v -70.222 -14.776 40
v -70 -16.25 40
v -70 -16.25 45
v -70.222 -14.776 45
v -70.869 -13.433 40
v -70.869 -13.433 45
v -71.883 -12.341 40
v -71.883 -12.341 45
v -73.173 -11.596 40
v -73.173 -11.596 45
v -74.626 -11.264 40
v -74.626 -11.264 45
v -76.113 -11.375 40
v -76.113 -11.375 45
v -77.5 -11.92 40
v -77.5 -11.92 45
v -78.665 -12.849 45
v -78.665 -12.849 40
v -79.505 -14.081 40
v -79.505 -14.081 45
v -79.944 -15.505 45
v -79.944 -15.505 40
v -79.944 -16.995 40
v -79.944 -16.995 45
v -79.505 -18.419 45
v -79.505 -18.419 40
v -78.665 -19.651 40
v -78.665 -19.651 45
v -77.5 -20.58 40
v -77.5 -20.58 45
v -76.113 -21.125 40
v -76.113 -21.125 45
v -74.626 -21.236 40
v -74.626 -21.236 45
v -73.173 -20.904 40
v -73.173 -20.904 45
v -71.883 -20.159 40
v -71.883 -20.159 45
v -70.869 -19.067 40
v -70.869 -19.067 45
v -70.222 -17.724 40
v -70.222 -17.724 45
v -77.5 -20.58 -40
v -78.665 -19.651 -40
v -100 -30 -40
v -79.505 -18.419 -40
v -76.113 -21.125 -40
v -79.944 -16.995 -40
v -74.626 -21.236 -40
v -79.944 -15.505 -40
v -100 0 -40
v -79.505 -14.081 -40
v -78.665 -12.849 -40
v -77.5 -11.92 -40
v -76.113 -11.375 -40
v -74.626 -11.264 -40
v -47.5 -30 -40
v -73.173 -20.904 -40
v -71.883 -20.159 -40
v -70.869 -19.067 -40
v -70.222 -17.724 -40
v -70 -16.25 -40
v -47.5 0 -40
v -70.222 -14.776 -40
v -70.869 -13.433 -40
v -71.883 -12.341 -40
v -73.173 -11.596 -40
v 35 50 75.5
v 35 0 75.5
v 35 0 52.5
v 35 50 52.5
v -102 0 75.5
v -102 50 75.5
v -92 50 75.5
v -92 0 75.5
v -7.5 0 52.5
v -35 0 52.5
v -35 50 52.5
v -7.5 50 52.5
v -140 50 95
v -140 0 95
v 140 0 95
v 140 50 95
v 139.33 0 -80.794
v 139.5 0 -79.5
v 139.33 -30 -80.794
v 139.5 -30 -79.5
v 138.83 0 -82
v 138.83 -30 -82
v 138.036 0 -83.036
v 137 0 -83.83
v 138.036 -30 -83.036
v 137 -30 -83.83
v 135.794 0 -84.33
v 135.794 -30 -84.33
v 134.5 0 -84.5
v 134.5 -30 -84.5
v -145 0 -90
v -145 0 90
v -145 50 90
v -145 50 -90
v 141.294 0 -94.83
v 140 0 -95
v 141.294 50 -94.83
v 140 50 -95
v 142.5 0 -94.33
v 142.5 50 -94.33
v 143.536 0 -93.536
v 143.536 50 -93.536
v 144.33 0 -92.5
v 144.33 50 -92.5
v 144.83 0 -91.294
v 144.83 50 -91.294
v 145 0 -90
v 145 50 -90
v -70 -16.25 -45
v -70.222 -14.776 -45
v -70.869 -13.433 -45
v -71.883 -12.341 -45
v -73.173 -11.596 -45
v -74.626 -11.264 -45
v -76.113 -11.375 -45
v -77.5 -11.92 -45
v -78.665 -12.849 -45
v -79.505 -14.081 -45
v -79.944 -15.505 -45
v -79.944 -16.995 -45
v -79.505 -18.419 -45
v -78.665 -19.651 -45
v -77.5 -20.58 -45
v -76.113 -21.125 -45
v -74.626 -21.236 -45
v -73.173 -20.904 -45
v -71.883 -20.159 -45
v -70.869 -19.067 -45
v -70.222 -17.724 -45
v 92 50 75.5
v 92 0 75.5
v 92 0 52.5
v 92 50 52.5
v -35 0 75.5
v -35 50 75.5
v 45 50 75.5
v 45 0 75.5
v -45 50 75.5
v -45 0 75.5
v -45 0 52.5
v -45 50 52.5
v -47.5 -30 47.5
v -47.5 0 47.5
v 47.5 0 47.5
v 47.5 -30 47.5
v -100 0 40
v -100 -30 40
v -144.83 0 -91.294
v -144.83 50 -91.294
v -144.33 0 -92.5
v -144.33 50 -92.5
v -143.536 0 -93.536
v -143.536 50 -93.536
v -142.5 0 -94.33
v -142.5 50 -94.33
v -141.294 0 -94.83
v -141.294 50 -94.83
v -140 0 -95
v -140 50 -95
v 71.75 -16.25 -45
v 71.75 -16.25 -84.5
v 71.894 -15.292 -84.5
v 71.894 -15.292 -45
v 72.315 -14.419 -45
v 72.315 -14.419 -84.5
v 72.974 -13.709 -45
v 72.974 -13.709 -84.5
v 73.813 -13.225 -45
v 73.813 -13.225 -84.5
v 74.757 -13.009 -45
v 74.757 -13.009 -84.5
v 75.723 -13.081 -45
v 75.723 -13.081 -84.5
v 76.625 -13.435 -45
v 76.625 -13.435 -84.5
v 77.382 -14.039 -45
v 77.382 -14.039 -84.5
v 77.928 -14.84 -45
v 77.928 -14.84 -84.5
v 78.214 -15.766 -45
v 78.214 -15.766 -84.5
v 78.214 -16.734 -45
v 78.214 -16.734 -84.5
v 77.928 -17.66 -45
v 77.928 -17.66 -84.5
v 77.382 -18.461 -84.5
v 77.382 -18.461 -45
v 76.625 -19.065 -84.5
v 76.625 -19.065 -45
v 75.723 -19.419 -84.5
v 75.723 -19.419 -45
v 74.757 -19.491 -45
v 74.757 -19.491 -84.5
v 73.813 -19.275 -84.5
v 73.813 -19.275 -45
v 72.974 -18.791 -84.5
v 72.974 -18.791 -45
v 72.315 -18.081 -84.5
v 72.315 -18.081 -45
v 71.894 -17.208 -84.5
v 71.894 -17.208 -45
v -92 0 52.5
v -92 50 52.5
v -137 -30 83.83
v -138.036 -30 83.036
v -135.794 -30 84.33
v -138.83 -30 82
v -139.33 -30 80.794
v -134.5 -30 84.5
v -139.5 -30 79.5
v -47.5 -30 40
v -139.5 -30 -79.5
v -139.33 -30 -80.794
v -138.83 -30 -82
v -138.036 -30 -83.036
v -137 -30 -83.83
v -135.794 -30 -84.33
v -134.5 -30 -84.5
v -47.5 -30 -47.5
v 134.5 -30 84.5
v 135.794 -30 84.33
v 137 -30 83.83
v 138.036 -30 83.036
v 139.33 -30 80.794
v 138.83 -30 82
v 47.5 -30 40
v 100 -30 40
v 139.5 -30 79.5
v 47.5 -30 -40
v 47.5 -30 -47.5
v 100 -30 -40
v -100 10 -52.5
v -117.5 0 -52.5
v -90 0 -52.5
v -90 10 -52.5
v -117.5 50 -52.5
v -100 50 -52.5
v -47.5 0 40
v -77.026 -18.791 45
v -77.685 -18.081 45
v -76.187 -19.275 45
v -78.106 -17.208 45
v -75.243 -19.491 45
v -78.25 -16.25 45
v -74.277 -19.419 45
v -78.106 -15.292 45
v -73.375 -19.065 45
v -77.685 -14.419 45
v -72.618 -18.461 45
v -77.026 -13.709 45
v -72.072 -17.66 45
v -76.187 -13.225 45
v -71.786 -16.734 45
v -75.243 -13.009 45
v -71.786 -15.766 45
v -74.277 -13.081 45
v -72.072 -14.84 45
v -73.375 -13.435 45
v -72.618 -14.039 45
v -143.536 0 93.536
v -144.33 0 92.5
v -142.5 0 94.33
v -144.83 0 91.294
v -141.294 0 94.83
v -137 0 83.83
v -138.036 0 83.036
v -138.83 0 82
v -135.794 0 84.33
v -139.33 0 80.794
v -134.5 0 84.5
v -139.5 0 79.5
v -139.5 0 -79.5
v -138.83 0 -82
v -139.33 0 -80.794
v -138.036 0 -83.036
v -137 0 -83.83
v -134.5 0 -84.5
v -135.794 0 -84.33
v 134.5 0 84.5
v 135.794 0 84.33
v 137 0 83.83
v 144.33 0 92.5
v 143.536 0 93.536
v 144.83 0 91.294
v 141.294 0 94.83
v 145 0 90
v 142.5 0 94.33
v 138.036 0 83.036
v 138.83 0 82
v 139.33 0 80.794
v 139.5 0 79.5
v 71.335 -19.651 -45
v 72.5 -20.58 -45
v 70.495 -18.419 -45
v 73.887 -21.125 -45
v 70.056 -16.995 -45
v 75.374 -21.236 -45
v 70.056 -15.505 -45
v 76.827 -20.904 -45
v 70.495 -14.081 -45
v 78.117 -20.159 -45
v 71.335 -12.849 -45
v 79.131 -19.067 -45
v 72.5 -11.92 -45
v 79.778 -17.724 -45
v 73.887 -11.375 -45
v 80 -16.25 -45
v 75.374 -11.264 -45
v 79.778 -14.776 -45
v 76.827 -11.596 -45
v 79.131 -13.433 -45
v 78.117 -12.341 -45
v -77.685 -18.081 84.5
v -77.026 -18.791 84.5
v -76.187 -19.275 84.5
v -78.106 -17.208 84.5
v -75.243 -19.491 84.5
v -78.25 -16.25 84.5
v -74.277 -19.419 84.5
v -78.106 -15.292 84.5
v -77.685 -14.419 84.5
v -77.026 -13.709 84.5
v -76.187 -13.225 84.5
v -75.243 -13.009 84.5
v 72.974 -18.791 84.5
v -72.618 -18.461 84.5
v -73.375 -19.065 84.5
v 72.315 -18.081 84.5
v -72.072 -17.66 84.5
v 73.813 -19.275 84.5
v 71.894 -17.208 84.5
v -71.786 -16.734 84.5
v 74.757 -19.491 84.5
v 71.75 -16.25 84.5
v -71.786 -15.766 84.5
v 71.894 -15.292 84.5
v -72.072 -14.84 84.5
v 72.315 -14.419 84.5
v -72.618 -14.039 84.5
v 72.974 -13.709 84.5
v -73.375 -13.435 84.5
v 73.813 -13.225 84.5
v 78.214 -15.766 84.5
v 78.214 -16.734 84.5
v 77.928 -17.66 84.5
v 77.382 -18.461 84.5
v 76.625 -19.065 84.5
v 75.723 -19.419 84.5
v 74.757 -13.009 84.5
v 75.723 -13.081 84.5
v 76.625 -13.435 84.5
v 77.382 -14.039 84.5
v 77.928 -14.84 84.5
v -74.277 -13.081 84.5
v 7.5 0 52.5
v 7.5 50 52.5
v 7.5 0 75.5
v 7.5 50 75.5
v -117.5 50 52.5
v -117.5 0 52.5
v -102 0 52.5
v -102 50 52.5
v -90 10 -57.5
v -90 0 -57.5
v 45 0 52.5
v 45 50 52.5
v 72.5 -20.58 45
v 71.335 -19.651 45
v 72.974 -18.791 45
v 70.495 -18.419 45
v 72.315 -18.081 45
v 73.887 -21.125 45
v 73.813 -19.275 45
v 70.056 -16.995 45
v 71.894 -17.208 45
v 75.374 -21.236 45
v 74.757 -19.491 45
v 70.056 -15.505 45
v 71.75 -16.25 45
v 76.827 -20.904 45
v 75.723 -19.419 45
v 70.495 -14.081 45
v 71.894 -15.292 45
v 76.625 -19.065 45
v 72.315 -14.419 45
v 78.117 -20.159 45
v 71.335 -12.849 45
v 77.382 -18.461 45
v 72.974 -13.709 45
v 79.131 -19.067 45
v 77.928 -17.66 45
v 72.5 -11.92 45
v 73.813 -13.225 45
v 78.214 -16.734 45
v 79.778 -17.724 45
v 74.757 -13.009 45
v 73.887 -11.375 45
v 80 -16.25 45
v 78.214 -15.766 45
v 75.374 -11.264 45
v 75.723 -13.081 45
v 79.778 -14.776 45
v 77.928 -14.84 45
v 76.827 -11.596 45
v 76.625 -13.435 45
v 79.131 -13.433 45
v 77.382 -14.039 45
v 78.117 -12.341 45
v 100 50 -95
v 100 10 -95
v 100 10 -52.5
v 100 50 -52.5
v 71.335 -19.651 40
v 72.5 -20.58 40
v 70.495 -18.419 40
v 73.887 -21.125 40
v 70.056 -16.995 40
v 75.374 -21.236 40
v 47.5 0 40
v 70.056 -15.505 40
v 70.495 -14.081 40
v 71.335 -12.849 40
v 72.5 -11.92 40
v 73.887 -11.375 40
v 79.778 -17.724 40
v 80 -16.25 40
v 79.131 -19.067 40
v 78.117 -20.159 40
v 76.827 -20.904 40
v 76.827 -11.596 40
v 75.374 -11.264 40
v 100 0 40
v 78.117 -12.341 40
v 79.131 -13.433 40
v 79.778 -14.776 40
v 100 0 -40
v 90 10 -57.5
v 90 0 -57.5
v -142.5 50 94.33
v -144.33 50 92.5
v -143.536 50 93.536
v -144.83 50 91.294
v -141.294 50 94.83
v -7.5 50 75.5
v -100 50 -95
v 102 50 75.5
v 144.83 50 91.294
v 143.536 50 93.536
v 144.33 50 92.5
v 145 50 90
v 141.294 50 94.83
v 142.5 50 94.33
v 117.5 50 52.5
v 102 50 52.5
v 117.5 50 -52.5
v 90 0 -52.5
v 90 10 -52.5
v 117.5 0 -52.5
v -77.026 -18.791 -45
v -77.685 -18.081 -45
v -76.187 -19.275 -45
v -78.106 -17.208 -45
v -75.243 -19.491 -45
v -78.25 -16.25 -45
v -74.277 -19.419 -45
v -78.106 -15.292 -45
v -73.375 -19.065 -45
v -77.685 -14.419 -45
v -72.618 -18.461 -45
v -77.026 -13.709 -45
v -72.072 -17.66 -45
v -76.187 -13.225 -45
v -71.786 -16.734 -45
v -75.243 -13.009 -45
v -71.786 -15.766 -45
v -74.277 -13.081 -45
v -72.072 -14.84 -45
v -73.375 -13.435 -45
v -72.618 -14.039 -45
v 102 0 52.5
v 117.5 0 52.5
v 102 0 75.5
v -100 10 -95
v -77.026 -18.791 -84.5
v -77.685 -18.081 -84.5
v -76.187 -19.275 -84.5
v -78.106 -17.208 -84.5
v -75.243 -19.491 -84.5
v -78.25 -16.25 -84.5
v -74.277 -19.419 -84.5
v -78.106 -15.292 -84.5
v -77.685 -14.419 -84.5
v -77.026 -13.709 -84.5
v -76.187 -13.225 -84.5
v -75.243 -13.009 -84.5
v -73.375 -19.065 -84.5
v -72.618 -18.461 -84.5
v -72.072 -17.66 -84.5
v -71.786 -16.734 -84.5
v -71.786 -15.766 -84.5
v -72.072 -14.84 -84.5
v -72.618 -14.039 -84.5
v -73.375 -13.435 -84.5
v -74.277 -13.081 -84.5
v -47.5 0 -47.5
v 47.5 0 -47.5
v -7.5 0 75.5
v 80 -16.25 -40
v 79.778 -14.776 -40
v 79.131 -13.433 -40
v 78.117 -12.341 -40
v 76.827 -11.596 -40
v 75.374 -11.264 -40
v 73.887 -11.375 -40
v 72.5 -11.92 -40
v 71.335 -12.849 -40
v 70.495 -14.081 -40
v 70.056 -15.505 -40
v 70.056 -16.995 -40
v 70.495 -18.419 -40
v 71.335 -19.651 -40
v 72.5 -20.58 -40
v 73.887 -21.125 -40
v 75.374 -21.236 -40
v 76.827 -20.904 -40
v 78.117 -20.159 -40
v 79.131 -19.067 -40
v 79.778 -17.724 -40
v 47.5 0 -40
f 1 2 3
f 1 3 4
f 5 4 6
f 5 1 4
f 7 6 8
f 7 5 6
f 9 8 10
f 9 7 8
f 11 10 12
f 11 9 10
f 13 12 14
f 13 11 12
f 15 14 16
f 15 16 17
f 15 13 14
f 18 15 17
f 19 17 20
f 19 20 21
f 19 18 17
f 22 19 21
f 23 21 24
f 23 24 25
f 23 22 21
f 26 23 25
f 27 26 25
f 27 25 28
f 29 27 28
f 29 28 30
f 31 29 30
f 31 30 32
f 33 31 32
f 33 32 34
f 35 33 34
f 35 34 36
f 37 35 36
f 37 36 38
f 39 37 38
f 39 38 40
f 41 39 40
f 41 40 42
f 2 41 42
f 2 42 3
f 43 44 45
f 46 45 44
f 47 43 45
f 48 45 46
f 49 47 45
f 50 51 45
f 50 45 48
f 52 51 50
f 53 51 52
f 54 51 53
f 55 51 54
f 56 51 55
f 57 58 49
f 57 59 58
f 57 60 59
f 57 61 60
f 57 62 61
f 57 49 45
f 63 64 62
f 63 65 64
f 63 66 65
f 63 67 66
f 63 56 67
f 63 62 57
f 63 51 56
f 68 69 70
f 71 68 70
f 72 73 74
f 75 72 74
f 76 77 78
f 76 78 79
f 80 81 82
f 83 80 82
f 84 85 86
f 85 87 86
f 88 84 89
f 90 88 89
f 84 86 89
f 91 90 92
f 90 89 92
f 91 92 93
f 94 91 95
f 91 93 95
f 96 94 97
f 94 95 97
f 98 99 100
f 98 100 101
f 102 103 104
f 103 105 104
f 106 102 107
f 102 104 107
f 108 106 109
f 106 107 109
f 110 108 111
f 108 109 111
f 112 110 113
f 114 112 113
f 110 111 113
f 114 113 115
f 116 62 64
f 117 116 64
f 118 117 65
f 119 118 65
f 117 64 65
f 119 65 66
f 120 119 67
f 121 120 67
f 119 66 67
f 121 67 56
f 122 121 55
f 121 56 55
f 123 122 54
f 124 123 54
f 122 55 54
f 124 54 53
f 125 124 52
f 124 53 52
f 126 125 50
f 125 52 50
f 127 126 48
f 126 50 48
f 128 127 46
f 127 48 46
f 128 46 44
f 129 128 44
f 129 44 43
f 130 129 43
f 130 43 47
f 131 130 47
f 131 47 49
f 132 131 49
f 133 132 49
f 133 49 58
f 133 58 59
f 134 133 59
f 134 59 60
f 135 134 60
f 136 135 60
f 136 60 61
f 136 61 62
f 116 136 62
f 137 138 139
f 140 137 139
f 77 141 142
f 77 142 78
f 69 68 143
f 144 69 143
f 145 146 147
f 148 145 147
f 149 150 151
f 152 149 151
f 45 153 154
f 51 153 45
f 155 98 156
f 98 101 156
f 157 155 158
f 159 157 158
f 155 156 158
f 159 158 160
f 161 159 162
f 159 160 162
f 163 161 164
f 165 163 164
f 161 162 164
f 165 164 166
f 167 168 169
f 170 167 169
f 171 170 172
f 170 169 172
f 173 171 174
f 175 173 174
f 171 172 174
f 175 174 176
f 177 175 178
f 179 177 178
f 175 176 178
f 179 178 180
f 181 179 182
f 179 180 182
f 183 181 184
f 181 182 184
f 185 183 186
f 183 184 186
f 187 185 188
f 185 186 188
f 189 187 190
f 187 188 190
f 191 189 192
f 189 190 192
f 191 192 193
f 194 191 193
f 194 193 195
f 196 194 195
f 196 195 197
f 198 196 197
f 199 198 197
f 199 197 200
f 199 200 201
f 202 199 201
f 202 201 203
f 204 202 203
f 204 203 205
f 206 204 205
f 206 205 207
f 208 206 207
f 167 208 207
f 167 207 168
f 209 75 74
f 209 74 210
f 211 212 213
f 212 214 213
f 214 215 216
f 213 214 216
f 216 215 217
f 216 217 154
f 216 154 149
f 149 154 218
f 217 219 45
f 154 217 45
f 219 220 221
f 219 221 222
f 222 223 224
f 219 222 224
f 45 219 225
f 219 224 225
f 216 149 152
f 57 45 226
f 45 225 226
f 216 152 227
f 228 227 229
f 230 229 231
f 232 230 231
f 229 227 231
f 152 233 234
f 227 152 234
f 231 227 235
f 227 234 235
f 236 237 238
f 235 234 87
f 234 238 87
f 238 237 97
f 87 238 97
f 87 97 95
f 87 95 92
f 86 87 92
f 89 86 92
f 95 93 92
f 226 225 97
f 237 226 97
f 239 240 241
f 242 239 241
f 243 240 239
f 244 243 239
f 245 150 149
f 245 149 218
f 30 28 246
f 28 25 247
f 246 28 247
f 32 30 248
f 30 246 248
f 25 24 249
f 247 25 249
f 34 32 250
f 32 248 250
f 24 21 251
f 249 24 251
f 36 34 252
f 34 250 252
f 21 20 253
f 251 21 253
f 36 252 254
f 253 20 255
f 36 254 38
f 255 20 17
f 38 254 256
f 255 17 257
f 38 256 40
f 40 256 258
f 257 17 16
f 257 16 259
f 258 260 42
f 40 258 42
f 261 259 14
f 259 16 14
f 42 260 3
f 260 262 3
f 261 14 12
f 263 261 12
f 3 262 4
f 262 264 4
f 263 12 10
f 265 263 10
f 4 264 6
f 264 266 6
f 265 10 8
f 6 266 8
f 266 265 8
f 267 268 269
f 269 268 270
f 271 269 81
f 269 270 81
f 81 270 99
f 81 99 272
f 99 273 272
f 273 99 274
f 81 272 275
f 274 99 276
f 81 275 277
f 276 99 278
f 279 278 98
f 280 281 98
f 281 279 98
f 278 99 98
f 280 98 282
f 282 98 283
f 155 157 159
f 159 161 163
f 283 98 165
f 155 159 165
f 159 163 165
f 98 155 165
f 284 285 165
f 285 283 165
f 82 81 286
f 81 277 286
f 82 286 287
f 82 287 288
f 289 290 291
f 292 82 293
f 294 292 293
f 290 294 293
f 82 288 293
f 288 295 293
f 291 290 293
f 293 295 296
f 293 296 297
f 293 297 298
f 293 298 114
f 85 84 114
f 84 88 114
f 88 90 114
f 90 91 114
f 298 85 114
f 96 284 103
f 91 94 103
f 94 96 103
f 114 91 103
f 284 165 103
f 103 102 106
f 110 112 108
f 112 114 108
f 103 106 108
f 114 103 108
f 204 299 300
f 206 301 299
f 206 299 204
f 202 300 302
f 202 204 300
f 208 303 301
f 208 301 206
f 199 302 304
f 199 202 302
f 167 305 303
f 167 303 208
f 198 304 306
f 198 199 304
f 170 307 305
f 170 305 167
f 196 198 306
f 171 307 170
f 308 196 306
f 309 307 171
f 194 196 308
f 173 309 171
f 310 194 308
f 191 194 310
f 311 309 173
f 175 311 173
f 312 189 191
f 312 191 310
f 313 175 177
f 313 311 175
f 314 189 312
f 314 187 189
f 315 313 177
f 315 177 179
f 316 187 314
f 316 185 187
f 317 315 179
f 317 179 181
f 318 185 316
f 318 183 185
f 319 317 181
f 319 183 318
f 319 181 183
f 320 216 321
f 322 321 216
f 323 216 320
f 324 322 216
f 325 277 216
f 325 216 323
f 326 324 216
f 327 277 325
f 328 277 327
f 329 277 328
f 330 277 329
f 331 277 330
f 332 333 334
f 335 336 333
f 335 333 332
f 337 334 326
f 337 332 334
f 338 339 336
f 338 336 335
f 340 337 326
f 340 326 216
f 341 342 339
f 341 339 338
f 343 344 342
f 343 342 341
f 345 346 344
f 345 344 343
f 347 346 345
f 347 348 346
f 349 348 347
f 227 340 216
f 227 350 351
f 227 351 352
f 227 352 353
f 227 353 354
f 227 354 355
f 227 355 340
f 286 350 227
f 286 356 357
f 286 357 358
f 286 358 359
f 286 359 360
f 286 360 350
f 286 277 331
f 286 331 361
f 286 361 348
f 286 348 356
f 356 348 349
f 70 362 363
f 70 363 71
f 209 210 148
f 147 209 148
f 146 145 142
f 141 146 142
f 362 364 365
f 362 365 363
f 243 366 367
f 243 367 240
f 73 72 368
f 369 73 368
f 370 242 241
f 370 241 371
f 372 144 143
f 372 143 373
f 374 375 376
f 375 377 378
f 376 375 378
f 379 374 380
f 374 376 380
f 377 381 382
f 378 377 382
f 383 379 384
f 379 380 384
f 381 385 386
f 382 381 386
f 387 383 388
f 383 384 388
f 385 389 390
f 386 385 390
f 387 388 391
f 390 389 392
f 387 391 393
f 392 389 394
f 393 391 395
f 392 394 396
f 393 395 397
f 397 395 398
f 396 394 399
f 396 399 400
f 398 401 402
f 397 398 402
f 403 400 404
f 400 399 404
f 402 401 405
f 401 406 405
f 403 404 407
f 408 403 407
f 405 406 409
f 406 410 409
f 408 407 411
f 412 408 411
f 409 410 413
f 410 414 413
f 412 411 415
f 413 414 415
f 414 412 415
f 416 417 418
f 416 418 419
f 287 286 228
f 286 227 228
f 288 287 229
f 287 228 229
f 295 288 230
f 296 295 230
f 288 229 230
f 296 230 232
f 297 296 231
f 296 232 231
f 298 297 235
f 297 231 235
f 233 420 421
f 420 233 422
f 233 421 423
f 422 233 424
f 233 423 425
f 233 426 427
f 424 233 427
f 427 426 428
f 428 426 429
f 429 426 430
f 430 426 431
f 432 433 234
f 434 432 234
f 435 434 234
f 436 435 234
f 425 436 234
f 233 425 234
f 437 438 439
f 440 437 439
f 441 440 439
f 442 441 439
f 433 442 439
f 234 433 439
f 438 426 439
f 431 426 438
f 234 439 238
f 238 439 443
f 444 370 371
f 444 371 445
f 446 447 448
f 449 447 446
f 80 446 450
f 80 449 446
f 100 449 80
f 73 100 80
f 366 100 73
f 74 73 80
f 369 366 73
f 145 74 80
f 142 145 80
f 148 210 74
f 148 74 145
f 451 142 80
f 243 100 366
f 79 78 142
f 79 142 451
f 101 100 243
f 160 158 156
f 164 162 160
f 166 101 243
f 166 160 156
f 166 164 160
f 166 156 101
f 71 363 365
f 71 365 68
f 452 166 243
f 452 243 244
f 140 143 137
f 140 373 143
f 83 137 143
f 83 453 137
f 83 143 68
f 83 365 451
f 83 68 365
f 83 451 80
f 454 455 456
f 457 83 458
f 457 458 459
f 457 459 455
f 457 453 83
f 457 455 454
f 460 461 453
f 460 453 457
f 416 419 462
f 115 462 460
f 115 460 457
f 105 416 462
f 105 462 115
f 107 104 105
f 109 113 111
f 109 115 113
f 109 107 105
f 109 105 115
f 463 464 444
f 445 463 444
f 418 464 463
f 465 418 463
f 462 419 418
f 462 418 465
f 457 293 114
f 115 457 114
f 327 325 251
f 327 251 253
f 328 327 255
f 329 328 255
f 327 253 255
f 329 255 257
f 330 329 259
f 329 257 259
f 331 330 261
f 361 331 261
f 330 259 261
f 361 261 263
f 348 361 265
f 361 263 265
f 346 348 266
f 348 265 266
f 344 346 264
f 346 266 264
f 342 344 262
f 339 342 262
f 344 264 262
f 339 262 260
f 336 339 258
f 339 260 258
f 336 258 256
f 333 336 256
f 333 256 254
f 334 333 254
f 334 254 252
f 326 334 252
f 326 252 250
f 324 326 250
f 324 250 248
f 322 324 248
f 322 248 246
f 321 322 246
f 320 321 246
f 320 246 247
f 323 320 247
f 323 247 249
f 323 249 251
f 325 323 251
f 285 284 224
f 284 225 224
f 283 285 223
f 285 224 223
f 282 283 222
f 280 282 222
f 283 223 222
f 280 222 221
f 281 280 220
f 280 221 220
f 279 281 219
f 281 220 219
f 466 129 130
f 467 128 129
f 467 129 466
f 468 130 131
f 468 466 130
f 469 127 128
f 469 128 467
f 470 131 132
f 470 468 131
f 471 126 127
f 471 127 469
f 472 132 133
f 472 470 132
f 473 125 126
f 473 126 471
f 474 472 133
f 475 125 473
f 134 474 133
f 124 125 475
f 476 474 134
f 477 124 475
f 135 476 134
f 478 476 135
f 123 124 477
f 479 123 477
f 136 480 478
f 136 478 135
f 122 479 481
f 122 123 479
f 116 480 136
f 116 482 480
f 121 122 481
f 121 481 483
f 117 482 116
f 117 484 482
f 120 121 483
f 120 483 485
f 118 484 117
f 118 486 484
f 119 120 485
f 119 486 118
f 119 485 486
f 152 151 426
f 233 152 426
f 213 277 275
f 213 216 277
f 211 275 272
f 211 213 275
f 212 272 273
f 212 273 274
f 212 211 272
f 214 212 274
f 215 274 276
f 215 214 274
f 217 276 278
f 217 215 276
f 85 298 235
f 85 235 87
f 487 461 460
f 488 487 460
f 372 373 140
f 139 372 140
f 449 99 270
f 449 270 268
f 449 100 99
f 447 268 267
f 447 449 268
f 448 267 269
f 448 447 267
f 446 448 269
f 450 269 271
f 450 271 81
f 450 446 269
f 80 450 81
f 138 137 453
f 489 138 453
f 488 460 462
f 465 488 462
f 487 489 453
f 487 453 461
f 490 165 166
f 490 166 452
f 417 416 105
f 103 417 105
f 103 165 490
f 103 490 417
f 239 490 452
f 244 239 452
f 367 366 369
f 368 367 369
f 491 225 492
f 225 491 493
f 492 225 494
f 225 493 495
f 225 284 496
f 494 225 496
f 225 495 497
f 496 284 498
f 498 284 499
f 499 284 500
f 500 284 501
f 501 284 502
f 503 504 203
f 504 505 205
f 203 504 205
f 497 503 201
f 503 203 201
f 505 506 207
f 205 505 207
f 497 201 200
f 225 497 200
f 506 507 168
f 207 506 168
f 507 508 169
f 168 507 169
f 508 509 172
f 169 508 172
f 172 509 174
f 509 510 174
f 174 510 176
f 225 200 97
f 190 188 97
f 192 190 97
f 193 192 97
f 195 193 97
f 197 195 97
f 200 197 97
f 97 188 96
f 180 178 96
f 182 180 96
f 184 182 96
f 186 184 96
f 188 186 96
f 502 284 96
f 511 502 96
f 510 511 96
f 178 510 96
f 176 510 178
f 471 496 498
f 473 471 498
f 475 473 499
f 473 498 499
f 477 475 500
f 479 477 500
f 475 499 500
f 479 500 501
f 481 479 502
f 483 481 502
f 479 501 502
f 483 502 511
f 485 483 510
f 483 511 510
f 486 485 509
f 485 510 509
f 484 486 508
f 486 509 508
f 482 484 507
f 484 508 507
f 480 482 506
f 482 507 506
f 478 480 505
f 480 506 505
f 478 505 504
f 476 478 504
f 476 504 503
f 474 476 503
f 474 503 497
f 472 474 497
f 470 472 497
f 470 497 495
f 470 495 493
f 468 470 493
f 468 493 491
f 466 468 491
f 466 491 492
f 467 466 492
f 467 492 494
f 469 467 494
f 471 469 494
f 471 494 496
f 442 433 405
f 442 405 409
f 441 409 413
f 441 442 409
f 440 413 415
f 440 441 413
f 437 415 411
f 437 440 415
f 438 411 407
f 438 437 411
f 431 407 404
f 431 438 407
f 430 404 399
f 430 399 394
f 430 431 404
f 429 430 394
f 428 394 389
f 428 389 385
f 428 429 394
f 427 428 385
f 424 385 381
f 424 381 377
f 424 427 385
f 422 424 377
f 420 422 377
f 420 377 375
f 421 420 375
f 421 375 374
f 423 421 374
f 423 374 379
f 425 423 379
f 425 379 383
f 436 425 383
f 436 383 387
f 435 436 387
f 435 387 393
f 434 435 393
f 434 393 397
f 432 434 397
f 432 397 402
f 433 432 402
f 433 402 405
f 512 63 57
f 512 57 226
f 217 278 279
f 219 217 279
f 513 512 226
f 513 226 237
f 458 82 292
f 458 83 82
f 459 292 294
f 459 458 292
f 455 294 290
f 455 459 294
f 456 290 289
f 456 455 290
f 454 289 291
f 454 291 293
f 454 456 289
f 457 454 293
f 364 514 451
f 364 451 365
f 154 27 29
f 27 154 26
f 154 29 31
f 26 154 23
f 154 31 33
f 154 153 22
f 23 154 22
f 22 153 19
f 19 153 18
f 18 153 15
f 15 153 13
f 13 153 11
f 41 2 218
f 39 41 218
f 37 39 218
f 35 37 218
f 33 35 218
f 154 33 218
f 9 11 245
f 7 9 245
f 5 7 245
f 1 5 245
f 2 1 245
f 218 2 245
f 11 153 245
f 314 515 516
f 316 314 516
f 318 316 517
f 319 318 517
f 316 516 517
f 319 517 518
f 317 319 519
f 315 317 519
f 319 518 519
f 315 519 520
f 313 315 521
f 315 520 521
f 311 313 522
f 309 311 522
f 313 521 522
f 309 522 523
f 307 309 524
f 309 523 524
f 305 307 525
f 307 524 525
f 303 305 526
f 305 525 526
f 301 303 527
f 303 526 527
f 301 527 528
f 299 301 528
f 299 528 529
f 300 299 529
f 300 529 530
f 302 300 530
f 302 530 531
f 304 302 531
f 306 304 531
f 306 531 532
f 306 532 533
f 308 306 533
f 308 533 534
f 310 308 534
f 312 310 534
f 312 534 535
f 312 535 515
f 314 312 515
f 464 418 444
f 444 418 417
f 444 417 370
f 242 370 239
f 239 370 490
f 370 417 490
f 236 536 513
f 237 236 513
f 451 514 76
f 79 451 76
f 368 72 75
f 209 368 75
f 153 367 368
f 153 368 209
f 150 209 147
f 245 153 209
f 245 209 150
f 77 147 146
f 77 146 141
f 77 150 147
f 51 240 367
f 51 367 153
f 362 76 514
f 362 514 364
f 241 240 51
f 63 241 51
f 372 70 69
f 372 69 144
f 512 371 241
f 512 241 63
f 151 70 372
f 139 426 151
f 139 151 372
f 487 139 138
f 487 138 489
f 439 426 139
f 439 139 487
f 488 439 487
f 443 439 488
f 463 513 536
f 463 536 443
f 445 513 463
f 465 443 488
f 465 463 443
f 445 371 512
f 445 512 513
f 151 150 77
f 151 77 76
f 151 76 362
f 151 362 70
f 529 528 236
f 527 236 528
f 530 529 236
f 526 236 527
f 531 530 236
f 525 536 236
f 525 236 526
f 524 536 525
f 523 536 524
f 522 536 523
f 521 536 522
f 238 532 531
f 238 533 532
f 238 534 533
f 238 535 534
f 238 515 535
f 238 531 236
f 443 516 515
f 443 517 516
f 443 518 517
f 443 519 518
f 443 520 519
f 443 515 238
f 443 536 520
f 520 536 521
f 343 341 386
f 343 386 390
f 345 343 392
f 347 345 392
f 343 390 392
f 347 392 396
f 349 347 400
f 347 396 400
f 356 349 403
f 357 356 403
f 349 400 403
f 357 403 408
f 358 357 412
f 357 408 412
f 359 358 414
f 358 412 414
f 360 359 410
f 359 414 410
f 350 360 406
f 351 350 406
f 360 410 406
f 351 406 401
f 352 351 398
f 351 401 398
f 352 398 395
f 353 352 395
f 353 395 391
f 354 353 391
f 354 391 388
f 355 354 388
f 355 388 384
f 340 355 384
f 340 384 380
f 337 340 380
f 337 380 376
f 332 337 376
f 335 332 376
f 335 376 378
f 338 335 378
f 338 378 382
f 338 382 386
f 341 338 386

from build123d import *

# Parameters (mm, degrees)
SKETCH1_W               = 279
SKETCH1_H               = 169
BOSS_EXTRUDE1_DEPTH     = 30
SKETCH2_W               = 290
SKETCH2_H               = 190
BOSS_EXTRUDE2_DEPTH     = 50
FILLET1_R               = 5
FILLET2_R               = 5
SKETCH3_W               = 235
SKETCH3_H               = 105
CUT_EXTRUDE1_DEPTH      = 50
SKETCH4_W               = 200
SKETCH4_H               = 80
CUT_EXTRUDE2_DEPTH      = 50
SKETCH5_W               = 180
SKETCH5_H               = 5
CUT_EXTRUDE3_DEPTH      = 50
SKETCH6_W               = 95
SKETCH6_H               = 95
CUT_EXTRUDE4_DEPTH      = 50
SKETCH7_W               = 15
SKETCH7_H               = 23
SKETCH7_W_2             = 10
CUT_EXTRUDE5_DEPTH      = 50
SKETCH8_R               = 3.25
CUT_EXTRUDE6_DEPTH      = 180.5
SKETCH9_R               = 5
CUT_EXTRUDE7_DEPTH      = 45
CUT_EXTRUDE7_DEPTH_BACK = 45
SKETCH11_W              = 200
SKETCH11_H              = 40
CUT_EXTRUDE9_DEPTH      = 50


with BuildPart() as part:
    # Sketch1 → Boss-Extrude1 (new body)
    with BuildSketch(Plane(origin=(0, 0, 0), x_dir=(1, 0, 0), z_dir=(0, 1, 0))):
        Rectangle(SKETCH1_W, SKETCH1_H)
    extrude(amount=-BOSS_EXTRUDE1_DEPTH)

    # Sketch2 → Boss-Extrude2 (add)
    with BuildSketch(Plane(origin=(0, 0, 0), x_dir=(1, 0, 0), z_dir=(0, 1, 0))):
        Rectangle(SKETCH2_W, SKETCH2_H)
    extrude(amount=BOSS_EXTRUDE2_DEPTH)

    # Fillet1
    fillet1_edges = [part.edges().sort_by_distance(p)[0] for p in [
        (139.5, -15, 84.5),
        (-139.5, -15, 84.5),
        (-139.5, -15, -84.5),
        (139.5, -15, -84.5),
    ]]
    fillet(fillet1_edges, radius=FILLET1_R)

    # Fillet2
    fillet2_edges = [part.edges().sort_by_distance(p)[0] for p in [
        (145, 25, 95),
        (145, 25, -95),
        (-145, 25, -95),
        (-145, 25, 95),
    ]]
    fillet(fillet2_edges, radius=FILLET2_R)

    # Sketch3 → Cut-Extrude1 (cut)
    with BuildSketch(Plane(origin=(0, 50, 0), x_dir=(1, 0, 0), z_dir=(0, 1, 0))):
        Rectangle(SKETCH3_W, SKETCH3_H)
    extrude(amount=-CUT_EXTRUDE1_DEPTH, mode=Mode.SUBTRACT)

    # Sketch4 → Cut-Extrude2 (cut)
    with BuildSketch(Plane(origin=(0, 0, 0), x_dir=(1, 0, 0), z_dir=(0, 1, 0))):
        Rectangle(SKETCH4_W, SKETCH4_H)
    extrude(amount=-CUT_EXTRUDE2_DEPTH, mode=Mode.SUBTRACT)

    # Sketch5 → Cut-Extrude3 (cut)
    with BuildSketch(Plane(origin=(0, 50, 0), x_dir=(1, 0, 0), z_dir=(0, 1, 0))):
        with Locations((0, 55)):
            Rectangle(SKETCH5_W, SKETCH5_H)
    extrude(amount=-CUT_EXTRUDE3_DEPTH, mode=Mode.SUBTRACT)

    # Sketch6 → Cut-Extrude4 (cut)
    with BuildSketch(Plane(origin=(0, 0, 0), x_dir=(1, 0, 0), z_dir=(0, 1, 0))):
        Rectangle(SKETCH6_W, SKETCH6_H)
    extrude(amount=-CUT_EXTRUDE4_DEPTH, mode=Mode.SUBTRACT)

    # Sketch7 → Cut-Extrude5 (cut)
    with BuildSketch(Plane(origin=(0, 50, 0), x_dir=(1, 0, 0), z_dir=(0, 1, 0))):
        with Locations((0, -64)):
            Rectangle(SKETCH7_W, SKETCH7_H)
        with Locations((40, -64)):
            Rectangle(SKETCH7_W_2, SKETCH7_H)
        with Locations((-40, -64)):
            Rectangle(SKETCH7_W_2, SKETCH7_H)
        with Locations((97, -64)):
            Rectangle(SKETCH7_W_2, SKETCH7_H)
        with Locations((-97, -64)):
            Rectangle(SKETCH7_W_2, SKETCH7_H)
    extrude(amount=-CUT_EXTRUDE5_DEPTH, mode=Mode.SUBTRACT)

    # Sketch8 → Cut-Extrude6 (cut, through all)
    with BuildSketch(Plane(origin=(0, 0, -84.5), x_dir=(-1, 0, 0), z_dir=(0, 0, -1))):
        with Locations((75, -16.25)):
            Circle(SKETCH8_R)
        with Locations((-75, -16.25)):
            Circle(SKETCH8_R)
    extrude(amount=-CUT_EXTRUDE6_DEPTH, mode=Mode.SUBTRACT)

    # Sketch9 → Cut-Extrude7 (cut, two sides)
    with BuildSketch(Plane.XY) as cut_extrude7_sk:
        with Locations((-75, -16.25)):
            Circle(SKETCH9_R)
        with Locations((75, -16.25)):
            Circle(SKETCH9_R)
    extrude(amount=CUT_EXTRUDE7_DEPTH, mode=Mode.SUBTRACT)
    extrude(cut_extrude7_sk.sketch, amount=-CUT_EXTRUDE7_DEPTH_BACK, mode=Mode.SUBTRACT)

    # Sketch11 → Cut-Extrude9 (cut)
    with BuildSketch(Plane(origin=(0, 0, -95), x_dir=(-1, 0, 0), z_dir=(0, 0, -1))):
        with Locations((0, 30)):
            Rectangle(SKETCH11_W, SKETCH11_H)
    extrude(amount=-CUT_EXTRUDE9_DEPTH, mode=Mode.SUBTRACT)


solid = part.part
